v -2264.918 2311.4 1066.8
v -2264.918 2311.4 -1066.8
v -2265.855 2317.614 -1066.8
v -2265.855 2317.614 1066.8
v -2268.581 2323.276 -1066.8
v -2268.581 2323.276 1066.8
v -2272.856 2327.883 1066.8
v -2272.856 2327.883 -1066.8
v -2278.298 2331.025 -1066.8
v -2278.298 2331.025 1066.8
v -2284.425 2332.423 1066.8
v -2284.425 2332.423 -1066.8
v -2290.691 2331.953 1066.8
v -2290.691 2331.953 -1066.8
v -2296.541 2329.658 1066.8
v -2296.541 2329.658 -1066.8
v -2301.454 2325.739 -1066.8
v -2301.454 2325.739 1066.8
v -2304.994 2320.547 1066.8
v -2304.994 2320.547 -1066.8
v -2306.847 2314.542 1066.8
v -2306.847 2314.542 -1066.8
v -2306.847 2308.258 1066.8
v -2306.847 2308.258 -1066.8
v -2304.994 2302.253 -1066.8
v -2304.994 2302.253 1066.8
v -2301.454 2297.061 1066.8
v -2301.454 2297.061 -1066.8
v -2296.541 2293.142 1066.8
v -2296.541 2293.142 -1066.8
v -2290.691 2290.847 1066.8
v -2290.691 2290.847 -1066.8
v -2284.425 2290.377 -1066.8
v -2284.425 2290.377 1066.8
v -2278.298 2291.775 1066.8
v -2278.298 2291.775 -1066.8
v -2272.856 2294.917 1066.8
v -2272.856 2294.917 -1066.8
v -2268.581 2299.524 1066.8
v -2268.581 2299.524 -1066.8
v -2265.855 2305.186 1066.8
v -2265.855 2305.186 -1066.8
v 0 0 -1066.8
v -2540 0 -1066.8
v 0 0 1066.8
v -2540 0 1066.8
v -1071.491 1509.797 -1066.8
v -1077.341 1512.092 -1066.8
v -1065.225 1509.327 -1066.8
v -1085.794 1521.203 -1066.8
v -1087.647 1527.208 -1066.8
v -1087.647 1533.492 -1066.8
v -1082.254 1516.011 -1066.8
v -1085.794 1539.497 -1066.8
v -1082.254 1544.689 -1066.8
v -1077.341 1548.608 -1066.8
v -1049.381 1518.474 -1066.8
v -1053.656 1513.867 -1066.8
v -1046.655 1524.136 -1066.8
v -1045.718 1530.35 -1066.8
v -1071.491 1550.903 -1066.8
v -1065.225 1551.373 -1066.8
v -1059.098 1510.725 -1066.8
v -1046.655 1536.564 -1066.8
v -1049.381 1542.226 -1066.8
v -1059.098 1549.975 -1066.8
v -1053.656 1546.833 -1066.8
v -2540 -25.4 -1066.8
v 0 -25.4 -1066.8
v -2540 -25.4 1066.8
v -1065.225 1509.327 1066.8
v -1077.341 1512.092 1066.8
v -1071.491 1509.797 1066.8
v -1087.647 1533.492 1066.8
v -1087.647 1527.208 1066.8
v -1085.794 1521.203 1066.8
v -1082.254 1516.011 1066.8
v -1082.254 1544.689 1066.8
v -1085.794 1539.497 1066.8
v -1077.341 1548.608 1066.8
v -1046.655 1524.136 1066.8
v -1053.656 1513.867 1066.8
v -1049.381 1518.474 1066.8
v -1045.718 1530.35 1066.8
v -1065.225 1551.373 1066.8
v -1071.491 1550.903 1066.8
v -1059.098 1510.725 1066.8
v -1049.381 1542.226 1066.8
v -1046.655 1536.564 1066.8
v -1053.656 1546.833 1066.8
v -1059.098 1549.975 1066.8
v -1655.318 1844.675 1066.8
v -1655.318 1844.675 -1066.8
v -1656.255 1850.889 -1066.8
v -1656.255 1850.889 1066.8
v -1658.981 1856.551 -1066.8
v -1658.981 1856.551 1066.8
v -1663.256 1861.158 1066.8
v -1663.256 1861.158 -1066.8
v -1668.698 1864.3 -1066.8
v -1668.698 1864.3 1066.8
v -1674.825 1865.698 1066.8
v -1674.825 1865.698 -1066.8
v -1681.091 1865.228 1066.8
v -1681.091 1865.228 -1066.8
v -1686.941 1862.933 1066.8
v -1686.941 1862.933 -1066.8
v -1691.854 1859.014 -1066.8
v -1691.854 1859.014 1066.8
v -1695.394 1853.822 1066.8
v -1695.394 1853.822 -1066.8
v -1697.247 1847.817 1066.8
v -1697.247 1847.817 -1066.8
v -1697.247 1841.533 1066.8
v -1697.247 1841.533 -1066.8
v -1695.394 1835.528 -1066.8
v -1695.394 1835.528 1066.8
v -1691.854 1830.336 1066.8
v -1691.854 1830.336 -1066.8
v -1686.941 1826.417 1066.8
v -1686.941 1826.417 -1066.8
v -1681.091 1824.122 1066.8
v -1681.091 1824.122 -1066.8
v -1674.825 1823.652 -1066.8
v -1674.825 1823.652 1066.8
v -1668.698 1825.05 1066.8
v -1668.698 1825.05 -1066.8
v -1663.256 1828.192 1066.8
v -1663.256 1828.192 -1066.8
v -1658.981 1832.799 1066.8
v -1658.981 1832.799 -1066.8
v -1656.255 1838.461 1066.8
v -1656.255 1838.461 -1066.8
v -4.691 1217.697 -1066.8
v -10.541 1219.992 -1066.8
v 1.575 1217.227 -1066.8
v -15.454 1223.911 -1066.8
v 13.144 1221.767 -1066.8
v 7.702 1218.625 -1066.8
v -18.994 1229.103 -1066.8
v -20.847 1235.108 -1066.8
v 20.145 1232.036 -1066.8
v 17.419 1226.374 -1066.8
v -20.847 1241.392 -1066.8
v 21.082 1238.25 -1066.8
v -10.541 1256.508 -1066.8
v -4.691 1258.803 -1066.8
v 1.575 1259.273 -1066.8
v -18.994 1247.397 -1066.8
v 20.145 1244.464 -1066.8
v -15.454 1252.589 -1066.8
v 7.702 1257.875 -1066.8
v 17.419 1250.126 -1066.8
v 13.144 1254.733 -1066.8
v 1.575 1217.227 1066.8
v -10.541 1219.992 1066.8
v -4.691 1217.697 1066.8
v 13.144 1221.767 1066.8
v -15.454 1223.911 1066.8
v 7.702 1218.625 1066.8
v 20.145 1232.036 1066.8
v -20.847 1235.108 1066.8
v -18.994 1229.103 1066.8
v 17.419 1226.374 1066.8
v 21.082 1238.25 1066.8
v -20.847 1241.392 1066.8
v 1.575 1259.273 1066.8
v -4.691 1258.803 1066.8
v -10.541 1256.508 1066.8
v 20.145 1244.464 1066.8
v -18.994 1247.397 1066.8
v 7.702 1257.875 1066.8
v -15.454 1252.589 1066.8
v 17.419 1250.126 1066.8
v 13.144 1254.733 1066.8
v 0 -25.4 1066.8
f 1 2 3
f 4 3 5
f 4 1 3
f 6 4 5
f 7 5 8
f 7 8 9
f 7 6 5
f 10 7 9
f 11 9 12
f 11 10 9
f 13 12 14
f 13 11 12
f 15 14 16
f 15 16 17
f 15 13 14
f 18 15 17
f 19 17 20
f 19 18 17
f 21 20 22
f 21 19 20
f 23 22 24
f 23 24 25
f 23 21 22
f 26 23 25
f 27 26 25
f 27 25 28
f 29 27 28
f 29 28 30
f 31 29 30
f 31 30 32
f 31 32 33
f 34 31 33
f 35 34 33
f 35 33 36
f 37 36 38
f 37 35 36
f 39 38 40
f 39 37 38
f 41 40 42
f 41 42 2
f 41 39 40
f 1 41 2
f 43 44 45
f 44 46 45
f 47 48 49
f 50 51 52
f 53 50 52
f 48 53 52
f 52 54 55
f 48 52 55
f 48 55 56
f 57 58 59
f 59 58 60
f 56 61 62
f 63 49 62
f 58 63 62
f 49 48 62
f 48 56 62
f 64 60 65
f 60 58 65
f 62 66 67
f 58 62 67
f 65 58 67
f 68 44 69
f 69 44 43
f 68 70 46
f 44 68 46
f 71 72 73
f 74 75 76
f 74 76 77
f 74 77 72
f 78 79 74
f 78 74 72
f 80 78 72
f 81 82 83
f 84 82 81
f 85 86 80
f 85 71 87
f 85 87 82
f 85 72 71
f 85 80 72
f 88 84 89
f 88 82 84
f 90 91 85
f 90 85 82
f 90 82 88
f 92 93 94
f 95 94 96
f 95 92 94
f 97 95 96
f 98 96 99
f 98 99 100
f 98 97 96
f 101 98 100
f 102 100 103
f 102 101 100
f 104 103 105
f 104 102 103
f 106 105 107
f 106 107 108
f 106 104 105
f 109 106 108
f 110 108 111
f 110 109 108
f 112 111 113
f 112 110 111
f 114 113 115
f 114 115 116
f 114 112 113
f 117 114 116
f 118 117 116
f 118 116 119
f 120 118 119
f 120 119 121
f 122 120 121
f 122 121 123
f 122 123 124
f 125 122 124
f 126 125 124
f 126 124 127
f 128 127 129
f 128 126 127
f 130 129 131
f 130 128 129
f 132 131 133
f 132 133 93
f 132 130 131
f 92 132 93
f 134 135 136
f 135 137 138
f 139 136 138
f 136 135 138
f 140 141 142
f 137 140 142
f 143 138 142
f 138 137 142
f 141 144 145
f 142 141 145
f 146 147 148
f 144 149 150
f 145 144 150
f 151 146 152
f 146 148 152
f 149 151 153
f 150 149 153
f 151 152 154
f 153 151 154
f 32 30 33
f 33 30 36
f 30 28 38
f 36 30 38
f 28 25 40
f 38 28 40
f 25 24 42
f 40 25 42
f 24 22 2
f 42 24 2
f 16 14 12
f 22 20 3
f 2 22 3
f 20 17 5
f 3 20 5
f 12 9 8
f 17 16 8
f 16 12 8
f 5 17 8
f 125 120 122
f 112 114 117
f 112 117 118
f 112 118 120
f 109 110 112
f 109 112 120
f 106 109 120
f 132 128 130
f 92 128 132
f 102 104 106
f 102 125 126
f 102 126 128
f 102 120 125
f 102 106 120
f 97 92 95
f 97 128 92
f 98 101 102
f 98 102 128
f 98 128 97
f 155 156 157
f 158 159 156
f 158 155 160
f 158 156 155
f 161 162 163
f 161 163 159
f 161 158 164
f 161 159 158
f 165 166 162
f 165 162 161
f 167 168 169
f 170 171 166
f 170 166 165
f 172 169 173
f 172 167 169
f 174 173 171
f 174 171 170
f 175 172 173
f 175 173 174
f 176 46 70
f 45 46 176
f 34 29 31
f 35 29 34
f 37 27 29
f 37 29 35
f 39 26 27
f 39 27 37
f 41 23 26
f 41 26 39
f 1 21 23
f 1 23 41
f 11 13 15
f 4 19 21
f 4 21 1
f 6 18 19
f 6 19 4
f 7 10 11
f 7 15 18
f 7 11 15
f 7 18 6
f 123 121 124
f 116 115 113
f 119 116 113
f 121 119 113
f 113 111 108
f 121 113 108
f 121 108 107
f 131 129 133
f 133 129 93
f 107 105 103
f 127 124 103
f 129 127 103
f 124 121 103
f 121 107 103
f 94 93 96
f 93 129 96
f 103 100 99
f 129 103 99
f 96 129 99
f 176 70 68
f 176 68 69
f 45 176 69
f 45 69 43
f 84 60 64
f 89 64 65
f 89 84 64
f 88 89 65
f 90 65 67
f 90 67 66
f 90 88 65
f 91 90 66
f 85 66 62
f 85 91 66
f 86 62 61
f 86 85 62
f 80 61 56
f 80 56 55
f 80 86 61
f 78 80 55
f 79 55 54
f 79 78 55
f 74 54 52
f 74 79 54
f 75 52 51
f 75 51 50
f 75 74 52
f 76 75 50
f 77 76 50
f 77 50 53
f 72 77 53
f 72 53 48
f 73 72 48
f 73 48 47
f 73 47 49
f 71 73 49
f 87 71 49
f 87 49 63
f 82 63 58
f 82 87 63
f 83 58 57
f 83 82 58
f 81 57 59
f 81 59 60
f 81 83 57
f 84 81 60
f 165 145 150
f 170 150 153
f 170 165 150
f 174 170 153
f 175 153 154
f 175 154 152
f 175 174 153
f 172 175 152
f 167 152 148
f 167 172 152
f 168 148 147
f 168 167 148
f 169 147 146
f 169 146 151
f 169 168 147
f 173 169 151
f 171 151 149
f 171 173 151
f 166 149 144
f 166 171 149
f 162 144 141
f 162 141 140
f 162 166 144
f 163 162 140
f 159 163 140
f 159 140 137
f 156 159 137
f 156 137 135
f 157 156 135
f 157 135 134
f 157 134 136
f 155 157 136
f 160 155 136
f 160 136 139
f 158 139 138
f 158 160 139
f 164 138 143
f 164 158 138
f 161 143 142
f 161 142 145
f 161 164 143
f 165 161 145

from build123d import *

# Parameters (mm, degrees)
SKETCH1_R             = 21.082
BOSS_EXTRUDE1_DEPTH   = 1066.8
BOSS_EXTRUDE1_2_DEPTH = 1066.8
BOSS_EXTRUDE1_3_DEPTH = 1066.8
BOSS_EXTRUDE1_4_DEPTH = 1066.8
SKETCH1_W             = 2540
SKETCH1_H             = 25.4
BOSS_EXTRUDE1_5_DEPTH = 1066.8


with BuildPart() as part:
    # Sketch1 → Boss-Extrude1 (new body, symmetric)
    with BuildSketch(Plane.XY):
        with Locations((0, 1238.25)):
            Circle(SKETCH1_R)
    extrude(amount=BOSS_EXTRUDE1_DEPTH, both=True)


with BuildPart() as body_2:
    # Sketch1 → Boss-Extrude1 2 (new body, symmetric)
    with BuildSketch(Plane.XY):
        with Locations((-1066.8, 1530.35)):
            Circle(SKETCH1_R)
    extrude(amount=BOSS_EXTRUDE1_2_DEPTH, both=True)


with BuildPart() as body_3:
    # Sketch1 → Boss-Extrude1 3 (new body, symmetric)
    with BuildSketch(Plane.XY):
        with Locations((-1676.4, 1844.675)):
            Circle(SKETCH1_R)
    extrude(amount=BOSS_EXTRUDE1_3_DEPTH, both=True)


with BuildPart() as body_4:
    # Sketch1 → Boss-Extrude1 4 (new body, symmetric)
    with BuildSketch(Plane.XY):
        with Locations((-2286, 2311.4)):
            Circle(SKETCH1_R)
    extrude(amount=BOSS_EXTRUDE1_4_DEPTH, both=True)


with BuildPart() as body_5:
    # Sketch1 → Boss-Extrude1 5 (new body, symmetric)
    with BuildSketch(Plane.XY):
        with Locations((-1270, -12.7)):
            Rectangle(SKETCH1_W, SKETCH1_H)
    extrude(amount=BOSS_EXTRUDE1_5_DEPTH, both=True)


solid = Compound([part.part, body_2.part, body_3.part, body_4.part, body_5.part])
